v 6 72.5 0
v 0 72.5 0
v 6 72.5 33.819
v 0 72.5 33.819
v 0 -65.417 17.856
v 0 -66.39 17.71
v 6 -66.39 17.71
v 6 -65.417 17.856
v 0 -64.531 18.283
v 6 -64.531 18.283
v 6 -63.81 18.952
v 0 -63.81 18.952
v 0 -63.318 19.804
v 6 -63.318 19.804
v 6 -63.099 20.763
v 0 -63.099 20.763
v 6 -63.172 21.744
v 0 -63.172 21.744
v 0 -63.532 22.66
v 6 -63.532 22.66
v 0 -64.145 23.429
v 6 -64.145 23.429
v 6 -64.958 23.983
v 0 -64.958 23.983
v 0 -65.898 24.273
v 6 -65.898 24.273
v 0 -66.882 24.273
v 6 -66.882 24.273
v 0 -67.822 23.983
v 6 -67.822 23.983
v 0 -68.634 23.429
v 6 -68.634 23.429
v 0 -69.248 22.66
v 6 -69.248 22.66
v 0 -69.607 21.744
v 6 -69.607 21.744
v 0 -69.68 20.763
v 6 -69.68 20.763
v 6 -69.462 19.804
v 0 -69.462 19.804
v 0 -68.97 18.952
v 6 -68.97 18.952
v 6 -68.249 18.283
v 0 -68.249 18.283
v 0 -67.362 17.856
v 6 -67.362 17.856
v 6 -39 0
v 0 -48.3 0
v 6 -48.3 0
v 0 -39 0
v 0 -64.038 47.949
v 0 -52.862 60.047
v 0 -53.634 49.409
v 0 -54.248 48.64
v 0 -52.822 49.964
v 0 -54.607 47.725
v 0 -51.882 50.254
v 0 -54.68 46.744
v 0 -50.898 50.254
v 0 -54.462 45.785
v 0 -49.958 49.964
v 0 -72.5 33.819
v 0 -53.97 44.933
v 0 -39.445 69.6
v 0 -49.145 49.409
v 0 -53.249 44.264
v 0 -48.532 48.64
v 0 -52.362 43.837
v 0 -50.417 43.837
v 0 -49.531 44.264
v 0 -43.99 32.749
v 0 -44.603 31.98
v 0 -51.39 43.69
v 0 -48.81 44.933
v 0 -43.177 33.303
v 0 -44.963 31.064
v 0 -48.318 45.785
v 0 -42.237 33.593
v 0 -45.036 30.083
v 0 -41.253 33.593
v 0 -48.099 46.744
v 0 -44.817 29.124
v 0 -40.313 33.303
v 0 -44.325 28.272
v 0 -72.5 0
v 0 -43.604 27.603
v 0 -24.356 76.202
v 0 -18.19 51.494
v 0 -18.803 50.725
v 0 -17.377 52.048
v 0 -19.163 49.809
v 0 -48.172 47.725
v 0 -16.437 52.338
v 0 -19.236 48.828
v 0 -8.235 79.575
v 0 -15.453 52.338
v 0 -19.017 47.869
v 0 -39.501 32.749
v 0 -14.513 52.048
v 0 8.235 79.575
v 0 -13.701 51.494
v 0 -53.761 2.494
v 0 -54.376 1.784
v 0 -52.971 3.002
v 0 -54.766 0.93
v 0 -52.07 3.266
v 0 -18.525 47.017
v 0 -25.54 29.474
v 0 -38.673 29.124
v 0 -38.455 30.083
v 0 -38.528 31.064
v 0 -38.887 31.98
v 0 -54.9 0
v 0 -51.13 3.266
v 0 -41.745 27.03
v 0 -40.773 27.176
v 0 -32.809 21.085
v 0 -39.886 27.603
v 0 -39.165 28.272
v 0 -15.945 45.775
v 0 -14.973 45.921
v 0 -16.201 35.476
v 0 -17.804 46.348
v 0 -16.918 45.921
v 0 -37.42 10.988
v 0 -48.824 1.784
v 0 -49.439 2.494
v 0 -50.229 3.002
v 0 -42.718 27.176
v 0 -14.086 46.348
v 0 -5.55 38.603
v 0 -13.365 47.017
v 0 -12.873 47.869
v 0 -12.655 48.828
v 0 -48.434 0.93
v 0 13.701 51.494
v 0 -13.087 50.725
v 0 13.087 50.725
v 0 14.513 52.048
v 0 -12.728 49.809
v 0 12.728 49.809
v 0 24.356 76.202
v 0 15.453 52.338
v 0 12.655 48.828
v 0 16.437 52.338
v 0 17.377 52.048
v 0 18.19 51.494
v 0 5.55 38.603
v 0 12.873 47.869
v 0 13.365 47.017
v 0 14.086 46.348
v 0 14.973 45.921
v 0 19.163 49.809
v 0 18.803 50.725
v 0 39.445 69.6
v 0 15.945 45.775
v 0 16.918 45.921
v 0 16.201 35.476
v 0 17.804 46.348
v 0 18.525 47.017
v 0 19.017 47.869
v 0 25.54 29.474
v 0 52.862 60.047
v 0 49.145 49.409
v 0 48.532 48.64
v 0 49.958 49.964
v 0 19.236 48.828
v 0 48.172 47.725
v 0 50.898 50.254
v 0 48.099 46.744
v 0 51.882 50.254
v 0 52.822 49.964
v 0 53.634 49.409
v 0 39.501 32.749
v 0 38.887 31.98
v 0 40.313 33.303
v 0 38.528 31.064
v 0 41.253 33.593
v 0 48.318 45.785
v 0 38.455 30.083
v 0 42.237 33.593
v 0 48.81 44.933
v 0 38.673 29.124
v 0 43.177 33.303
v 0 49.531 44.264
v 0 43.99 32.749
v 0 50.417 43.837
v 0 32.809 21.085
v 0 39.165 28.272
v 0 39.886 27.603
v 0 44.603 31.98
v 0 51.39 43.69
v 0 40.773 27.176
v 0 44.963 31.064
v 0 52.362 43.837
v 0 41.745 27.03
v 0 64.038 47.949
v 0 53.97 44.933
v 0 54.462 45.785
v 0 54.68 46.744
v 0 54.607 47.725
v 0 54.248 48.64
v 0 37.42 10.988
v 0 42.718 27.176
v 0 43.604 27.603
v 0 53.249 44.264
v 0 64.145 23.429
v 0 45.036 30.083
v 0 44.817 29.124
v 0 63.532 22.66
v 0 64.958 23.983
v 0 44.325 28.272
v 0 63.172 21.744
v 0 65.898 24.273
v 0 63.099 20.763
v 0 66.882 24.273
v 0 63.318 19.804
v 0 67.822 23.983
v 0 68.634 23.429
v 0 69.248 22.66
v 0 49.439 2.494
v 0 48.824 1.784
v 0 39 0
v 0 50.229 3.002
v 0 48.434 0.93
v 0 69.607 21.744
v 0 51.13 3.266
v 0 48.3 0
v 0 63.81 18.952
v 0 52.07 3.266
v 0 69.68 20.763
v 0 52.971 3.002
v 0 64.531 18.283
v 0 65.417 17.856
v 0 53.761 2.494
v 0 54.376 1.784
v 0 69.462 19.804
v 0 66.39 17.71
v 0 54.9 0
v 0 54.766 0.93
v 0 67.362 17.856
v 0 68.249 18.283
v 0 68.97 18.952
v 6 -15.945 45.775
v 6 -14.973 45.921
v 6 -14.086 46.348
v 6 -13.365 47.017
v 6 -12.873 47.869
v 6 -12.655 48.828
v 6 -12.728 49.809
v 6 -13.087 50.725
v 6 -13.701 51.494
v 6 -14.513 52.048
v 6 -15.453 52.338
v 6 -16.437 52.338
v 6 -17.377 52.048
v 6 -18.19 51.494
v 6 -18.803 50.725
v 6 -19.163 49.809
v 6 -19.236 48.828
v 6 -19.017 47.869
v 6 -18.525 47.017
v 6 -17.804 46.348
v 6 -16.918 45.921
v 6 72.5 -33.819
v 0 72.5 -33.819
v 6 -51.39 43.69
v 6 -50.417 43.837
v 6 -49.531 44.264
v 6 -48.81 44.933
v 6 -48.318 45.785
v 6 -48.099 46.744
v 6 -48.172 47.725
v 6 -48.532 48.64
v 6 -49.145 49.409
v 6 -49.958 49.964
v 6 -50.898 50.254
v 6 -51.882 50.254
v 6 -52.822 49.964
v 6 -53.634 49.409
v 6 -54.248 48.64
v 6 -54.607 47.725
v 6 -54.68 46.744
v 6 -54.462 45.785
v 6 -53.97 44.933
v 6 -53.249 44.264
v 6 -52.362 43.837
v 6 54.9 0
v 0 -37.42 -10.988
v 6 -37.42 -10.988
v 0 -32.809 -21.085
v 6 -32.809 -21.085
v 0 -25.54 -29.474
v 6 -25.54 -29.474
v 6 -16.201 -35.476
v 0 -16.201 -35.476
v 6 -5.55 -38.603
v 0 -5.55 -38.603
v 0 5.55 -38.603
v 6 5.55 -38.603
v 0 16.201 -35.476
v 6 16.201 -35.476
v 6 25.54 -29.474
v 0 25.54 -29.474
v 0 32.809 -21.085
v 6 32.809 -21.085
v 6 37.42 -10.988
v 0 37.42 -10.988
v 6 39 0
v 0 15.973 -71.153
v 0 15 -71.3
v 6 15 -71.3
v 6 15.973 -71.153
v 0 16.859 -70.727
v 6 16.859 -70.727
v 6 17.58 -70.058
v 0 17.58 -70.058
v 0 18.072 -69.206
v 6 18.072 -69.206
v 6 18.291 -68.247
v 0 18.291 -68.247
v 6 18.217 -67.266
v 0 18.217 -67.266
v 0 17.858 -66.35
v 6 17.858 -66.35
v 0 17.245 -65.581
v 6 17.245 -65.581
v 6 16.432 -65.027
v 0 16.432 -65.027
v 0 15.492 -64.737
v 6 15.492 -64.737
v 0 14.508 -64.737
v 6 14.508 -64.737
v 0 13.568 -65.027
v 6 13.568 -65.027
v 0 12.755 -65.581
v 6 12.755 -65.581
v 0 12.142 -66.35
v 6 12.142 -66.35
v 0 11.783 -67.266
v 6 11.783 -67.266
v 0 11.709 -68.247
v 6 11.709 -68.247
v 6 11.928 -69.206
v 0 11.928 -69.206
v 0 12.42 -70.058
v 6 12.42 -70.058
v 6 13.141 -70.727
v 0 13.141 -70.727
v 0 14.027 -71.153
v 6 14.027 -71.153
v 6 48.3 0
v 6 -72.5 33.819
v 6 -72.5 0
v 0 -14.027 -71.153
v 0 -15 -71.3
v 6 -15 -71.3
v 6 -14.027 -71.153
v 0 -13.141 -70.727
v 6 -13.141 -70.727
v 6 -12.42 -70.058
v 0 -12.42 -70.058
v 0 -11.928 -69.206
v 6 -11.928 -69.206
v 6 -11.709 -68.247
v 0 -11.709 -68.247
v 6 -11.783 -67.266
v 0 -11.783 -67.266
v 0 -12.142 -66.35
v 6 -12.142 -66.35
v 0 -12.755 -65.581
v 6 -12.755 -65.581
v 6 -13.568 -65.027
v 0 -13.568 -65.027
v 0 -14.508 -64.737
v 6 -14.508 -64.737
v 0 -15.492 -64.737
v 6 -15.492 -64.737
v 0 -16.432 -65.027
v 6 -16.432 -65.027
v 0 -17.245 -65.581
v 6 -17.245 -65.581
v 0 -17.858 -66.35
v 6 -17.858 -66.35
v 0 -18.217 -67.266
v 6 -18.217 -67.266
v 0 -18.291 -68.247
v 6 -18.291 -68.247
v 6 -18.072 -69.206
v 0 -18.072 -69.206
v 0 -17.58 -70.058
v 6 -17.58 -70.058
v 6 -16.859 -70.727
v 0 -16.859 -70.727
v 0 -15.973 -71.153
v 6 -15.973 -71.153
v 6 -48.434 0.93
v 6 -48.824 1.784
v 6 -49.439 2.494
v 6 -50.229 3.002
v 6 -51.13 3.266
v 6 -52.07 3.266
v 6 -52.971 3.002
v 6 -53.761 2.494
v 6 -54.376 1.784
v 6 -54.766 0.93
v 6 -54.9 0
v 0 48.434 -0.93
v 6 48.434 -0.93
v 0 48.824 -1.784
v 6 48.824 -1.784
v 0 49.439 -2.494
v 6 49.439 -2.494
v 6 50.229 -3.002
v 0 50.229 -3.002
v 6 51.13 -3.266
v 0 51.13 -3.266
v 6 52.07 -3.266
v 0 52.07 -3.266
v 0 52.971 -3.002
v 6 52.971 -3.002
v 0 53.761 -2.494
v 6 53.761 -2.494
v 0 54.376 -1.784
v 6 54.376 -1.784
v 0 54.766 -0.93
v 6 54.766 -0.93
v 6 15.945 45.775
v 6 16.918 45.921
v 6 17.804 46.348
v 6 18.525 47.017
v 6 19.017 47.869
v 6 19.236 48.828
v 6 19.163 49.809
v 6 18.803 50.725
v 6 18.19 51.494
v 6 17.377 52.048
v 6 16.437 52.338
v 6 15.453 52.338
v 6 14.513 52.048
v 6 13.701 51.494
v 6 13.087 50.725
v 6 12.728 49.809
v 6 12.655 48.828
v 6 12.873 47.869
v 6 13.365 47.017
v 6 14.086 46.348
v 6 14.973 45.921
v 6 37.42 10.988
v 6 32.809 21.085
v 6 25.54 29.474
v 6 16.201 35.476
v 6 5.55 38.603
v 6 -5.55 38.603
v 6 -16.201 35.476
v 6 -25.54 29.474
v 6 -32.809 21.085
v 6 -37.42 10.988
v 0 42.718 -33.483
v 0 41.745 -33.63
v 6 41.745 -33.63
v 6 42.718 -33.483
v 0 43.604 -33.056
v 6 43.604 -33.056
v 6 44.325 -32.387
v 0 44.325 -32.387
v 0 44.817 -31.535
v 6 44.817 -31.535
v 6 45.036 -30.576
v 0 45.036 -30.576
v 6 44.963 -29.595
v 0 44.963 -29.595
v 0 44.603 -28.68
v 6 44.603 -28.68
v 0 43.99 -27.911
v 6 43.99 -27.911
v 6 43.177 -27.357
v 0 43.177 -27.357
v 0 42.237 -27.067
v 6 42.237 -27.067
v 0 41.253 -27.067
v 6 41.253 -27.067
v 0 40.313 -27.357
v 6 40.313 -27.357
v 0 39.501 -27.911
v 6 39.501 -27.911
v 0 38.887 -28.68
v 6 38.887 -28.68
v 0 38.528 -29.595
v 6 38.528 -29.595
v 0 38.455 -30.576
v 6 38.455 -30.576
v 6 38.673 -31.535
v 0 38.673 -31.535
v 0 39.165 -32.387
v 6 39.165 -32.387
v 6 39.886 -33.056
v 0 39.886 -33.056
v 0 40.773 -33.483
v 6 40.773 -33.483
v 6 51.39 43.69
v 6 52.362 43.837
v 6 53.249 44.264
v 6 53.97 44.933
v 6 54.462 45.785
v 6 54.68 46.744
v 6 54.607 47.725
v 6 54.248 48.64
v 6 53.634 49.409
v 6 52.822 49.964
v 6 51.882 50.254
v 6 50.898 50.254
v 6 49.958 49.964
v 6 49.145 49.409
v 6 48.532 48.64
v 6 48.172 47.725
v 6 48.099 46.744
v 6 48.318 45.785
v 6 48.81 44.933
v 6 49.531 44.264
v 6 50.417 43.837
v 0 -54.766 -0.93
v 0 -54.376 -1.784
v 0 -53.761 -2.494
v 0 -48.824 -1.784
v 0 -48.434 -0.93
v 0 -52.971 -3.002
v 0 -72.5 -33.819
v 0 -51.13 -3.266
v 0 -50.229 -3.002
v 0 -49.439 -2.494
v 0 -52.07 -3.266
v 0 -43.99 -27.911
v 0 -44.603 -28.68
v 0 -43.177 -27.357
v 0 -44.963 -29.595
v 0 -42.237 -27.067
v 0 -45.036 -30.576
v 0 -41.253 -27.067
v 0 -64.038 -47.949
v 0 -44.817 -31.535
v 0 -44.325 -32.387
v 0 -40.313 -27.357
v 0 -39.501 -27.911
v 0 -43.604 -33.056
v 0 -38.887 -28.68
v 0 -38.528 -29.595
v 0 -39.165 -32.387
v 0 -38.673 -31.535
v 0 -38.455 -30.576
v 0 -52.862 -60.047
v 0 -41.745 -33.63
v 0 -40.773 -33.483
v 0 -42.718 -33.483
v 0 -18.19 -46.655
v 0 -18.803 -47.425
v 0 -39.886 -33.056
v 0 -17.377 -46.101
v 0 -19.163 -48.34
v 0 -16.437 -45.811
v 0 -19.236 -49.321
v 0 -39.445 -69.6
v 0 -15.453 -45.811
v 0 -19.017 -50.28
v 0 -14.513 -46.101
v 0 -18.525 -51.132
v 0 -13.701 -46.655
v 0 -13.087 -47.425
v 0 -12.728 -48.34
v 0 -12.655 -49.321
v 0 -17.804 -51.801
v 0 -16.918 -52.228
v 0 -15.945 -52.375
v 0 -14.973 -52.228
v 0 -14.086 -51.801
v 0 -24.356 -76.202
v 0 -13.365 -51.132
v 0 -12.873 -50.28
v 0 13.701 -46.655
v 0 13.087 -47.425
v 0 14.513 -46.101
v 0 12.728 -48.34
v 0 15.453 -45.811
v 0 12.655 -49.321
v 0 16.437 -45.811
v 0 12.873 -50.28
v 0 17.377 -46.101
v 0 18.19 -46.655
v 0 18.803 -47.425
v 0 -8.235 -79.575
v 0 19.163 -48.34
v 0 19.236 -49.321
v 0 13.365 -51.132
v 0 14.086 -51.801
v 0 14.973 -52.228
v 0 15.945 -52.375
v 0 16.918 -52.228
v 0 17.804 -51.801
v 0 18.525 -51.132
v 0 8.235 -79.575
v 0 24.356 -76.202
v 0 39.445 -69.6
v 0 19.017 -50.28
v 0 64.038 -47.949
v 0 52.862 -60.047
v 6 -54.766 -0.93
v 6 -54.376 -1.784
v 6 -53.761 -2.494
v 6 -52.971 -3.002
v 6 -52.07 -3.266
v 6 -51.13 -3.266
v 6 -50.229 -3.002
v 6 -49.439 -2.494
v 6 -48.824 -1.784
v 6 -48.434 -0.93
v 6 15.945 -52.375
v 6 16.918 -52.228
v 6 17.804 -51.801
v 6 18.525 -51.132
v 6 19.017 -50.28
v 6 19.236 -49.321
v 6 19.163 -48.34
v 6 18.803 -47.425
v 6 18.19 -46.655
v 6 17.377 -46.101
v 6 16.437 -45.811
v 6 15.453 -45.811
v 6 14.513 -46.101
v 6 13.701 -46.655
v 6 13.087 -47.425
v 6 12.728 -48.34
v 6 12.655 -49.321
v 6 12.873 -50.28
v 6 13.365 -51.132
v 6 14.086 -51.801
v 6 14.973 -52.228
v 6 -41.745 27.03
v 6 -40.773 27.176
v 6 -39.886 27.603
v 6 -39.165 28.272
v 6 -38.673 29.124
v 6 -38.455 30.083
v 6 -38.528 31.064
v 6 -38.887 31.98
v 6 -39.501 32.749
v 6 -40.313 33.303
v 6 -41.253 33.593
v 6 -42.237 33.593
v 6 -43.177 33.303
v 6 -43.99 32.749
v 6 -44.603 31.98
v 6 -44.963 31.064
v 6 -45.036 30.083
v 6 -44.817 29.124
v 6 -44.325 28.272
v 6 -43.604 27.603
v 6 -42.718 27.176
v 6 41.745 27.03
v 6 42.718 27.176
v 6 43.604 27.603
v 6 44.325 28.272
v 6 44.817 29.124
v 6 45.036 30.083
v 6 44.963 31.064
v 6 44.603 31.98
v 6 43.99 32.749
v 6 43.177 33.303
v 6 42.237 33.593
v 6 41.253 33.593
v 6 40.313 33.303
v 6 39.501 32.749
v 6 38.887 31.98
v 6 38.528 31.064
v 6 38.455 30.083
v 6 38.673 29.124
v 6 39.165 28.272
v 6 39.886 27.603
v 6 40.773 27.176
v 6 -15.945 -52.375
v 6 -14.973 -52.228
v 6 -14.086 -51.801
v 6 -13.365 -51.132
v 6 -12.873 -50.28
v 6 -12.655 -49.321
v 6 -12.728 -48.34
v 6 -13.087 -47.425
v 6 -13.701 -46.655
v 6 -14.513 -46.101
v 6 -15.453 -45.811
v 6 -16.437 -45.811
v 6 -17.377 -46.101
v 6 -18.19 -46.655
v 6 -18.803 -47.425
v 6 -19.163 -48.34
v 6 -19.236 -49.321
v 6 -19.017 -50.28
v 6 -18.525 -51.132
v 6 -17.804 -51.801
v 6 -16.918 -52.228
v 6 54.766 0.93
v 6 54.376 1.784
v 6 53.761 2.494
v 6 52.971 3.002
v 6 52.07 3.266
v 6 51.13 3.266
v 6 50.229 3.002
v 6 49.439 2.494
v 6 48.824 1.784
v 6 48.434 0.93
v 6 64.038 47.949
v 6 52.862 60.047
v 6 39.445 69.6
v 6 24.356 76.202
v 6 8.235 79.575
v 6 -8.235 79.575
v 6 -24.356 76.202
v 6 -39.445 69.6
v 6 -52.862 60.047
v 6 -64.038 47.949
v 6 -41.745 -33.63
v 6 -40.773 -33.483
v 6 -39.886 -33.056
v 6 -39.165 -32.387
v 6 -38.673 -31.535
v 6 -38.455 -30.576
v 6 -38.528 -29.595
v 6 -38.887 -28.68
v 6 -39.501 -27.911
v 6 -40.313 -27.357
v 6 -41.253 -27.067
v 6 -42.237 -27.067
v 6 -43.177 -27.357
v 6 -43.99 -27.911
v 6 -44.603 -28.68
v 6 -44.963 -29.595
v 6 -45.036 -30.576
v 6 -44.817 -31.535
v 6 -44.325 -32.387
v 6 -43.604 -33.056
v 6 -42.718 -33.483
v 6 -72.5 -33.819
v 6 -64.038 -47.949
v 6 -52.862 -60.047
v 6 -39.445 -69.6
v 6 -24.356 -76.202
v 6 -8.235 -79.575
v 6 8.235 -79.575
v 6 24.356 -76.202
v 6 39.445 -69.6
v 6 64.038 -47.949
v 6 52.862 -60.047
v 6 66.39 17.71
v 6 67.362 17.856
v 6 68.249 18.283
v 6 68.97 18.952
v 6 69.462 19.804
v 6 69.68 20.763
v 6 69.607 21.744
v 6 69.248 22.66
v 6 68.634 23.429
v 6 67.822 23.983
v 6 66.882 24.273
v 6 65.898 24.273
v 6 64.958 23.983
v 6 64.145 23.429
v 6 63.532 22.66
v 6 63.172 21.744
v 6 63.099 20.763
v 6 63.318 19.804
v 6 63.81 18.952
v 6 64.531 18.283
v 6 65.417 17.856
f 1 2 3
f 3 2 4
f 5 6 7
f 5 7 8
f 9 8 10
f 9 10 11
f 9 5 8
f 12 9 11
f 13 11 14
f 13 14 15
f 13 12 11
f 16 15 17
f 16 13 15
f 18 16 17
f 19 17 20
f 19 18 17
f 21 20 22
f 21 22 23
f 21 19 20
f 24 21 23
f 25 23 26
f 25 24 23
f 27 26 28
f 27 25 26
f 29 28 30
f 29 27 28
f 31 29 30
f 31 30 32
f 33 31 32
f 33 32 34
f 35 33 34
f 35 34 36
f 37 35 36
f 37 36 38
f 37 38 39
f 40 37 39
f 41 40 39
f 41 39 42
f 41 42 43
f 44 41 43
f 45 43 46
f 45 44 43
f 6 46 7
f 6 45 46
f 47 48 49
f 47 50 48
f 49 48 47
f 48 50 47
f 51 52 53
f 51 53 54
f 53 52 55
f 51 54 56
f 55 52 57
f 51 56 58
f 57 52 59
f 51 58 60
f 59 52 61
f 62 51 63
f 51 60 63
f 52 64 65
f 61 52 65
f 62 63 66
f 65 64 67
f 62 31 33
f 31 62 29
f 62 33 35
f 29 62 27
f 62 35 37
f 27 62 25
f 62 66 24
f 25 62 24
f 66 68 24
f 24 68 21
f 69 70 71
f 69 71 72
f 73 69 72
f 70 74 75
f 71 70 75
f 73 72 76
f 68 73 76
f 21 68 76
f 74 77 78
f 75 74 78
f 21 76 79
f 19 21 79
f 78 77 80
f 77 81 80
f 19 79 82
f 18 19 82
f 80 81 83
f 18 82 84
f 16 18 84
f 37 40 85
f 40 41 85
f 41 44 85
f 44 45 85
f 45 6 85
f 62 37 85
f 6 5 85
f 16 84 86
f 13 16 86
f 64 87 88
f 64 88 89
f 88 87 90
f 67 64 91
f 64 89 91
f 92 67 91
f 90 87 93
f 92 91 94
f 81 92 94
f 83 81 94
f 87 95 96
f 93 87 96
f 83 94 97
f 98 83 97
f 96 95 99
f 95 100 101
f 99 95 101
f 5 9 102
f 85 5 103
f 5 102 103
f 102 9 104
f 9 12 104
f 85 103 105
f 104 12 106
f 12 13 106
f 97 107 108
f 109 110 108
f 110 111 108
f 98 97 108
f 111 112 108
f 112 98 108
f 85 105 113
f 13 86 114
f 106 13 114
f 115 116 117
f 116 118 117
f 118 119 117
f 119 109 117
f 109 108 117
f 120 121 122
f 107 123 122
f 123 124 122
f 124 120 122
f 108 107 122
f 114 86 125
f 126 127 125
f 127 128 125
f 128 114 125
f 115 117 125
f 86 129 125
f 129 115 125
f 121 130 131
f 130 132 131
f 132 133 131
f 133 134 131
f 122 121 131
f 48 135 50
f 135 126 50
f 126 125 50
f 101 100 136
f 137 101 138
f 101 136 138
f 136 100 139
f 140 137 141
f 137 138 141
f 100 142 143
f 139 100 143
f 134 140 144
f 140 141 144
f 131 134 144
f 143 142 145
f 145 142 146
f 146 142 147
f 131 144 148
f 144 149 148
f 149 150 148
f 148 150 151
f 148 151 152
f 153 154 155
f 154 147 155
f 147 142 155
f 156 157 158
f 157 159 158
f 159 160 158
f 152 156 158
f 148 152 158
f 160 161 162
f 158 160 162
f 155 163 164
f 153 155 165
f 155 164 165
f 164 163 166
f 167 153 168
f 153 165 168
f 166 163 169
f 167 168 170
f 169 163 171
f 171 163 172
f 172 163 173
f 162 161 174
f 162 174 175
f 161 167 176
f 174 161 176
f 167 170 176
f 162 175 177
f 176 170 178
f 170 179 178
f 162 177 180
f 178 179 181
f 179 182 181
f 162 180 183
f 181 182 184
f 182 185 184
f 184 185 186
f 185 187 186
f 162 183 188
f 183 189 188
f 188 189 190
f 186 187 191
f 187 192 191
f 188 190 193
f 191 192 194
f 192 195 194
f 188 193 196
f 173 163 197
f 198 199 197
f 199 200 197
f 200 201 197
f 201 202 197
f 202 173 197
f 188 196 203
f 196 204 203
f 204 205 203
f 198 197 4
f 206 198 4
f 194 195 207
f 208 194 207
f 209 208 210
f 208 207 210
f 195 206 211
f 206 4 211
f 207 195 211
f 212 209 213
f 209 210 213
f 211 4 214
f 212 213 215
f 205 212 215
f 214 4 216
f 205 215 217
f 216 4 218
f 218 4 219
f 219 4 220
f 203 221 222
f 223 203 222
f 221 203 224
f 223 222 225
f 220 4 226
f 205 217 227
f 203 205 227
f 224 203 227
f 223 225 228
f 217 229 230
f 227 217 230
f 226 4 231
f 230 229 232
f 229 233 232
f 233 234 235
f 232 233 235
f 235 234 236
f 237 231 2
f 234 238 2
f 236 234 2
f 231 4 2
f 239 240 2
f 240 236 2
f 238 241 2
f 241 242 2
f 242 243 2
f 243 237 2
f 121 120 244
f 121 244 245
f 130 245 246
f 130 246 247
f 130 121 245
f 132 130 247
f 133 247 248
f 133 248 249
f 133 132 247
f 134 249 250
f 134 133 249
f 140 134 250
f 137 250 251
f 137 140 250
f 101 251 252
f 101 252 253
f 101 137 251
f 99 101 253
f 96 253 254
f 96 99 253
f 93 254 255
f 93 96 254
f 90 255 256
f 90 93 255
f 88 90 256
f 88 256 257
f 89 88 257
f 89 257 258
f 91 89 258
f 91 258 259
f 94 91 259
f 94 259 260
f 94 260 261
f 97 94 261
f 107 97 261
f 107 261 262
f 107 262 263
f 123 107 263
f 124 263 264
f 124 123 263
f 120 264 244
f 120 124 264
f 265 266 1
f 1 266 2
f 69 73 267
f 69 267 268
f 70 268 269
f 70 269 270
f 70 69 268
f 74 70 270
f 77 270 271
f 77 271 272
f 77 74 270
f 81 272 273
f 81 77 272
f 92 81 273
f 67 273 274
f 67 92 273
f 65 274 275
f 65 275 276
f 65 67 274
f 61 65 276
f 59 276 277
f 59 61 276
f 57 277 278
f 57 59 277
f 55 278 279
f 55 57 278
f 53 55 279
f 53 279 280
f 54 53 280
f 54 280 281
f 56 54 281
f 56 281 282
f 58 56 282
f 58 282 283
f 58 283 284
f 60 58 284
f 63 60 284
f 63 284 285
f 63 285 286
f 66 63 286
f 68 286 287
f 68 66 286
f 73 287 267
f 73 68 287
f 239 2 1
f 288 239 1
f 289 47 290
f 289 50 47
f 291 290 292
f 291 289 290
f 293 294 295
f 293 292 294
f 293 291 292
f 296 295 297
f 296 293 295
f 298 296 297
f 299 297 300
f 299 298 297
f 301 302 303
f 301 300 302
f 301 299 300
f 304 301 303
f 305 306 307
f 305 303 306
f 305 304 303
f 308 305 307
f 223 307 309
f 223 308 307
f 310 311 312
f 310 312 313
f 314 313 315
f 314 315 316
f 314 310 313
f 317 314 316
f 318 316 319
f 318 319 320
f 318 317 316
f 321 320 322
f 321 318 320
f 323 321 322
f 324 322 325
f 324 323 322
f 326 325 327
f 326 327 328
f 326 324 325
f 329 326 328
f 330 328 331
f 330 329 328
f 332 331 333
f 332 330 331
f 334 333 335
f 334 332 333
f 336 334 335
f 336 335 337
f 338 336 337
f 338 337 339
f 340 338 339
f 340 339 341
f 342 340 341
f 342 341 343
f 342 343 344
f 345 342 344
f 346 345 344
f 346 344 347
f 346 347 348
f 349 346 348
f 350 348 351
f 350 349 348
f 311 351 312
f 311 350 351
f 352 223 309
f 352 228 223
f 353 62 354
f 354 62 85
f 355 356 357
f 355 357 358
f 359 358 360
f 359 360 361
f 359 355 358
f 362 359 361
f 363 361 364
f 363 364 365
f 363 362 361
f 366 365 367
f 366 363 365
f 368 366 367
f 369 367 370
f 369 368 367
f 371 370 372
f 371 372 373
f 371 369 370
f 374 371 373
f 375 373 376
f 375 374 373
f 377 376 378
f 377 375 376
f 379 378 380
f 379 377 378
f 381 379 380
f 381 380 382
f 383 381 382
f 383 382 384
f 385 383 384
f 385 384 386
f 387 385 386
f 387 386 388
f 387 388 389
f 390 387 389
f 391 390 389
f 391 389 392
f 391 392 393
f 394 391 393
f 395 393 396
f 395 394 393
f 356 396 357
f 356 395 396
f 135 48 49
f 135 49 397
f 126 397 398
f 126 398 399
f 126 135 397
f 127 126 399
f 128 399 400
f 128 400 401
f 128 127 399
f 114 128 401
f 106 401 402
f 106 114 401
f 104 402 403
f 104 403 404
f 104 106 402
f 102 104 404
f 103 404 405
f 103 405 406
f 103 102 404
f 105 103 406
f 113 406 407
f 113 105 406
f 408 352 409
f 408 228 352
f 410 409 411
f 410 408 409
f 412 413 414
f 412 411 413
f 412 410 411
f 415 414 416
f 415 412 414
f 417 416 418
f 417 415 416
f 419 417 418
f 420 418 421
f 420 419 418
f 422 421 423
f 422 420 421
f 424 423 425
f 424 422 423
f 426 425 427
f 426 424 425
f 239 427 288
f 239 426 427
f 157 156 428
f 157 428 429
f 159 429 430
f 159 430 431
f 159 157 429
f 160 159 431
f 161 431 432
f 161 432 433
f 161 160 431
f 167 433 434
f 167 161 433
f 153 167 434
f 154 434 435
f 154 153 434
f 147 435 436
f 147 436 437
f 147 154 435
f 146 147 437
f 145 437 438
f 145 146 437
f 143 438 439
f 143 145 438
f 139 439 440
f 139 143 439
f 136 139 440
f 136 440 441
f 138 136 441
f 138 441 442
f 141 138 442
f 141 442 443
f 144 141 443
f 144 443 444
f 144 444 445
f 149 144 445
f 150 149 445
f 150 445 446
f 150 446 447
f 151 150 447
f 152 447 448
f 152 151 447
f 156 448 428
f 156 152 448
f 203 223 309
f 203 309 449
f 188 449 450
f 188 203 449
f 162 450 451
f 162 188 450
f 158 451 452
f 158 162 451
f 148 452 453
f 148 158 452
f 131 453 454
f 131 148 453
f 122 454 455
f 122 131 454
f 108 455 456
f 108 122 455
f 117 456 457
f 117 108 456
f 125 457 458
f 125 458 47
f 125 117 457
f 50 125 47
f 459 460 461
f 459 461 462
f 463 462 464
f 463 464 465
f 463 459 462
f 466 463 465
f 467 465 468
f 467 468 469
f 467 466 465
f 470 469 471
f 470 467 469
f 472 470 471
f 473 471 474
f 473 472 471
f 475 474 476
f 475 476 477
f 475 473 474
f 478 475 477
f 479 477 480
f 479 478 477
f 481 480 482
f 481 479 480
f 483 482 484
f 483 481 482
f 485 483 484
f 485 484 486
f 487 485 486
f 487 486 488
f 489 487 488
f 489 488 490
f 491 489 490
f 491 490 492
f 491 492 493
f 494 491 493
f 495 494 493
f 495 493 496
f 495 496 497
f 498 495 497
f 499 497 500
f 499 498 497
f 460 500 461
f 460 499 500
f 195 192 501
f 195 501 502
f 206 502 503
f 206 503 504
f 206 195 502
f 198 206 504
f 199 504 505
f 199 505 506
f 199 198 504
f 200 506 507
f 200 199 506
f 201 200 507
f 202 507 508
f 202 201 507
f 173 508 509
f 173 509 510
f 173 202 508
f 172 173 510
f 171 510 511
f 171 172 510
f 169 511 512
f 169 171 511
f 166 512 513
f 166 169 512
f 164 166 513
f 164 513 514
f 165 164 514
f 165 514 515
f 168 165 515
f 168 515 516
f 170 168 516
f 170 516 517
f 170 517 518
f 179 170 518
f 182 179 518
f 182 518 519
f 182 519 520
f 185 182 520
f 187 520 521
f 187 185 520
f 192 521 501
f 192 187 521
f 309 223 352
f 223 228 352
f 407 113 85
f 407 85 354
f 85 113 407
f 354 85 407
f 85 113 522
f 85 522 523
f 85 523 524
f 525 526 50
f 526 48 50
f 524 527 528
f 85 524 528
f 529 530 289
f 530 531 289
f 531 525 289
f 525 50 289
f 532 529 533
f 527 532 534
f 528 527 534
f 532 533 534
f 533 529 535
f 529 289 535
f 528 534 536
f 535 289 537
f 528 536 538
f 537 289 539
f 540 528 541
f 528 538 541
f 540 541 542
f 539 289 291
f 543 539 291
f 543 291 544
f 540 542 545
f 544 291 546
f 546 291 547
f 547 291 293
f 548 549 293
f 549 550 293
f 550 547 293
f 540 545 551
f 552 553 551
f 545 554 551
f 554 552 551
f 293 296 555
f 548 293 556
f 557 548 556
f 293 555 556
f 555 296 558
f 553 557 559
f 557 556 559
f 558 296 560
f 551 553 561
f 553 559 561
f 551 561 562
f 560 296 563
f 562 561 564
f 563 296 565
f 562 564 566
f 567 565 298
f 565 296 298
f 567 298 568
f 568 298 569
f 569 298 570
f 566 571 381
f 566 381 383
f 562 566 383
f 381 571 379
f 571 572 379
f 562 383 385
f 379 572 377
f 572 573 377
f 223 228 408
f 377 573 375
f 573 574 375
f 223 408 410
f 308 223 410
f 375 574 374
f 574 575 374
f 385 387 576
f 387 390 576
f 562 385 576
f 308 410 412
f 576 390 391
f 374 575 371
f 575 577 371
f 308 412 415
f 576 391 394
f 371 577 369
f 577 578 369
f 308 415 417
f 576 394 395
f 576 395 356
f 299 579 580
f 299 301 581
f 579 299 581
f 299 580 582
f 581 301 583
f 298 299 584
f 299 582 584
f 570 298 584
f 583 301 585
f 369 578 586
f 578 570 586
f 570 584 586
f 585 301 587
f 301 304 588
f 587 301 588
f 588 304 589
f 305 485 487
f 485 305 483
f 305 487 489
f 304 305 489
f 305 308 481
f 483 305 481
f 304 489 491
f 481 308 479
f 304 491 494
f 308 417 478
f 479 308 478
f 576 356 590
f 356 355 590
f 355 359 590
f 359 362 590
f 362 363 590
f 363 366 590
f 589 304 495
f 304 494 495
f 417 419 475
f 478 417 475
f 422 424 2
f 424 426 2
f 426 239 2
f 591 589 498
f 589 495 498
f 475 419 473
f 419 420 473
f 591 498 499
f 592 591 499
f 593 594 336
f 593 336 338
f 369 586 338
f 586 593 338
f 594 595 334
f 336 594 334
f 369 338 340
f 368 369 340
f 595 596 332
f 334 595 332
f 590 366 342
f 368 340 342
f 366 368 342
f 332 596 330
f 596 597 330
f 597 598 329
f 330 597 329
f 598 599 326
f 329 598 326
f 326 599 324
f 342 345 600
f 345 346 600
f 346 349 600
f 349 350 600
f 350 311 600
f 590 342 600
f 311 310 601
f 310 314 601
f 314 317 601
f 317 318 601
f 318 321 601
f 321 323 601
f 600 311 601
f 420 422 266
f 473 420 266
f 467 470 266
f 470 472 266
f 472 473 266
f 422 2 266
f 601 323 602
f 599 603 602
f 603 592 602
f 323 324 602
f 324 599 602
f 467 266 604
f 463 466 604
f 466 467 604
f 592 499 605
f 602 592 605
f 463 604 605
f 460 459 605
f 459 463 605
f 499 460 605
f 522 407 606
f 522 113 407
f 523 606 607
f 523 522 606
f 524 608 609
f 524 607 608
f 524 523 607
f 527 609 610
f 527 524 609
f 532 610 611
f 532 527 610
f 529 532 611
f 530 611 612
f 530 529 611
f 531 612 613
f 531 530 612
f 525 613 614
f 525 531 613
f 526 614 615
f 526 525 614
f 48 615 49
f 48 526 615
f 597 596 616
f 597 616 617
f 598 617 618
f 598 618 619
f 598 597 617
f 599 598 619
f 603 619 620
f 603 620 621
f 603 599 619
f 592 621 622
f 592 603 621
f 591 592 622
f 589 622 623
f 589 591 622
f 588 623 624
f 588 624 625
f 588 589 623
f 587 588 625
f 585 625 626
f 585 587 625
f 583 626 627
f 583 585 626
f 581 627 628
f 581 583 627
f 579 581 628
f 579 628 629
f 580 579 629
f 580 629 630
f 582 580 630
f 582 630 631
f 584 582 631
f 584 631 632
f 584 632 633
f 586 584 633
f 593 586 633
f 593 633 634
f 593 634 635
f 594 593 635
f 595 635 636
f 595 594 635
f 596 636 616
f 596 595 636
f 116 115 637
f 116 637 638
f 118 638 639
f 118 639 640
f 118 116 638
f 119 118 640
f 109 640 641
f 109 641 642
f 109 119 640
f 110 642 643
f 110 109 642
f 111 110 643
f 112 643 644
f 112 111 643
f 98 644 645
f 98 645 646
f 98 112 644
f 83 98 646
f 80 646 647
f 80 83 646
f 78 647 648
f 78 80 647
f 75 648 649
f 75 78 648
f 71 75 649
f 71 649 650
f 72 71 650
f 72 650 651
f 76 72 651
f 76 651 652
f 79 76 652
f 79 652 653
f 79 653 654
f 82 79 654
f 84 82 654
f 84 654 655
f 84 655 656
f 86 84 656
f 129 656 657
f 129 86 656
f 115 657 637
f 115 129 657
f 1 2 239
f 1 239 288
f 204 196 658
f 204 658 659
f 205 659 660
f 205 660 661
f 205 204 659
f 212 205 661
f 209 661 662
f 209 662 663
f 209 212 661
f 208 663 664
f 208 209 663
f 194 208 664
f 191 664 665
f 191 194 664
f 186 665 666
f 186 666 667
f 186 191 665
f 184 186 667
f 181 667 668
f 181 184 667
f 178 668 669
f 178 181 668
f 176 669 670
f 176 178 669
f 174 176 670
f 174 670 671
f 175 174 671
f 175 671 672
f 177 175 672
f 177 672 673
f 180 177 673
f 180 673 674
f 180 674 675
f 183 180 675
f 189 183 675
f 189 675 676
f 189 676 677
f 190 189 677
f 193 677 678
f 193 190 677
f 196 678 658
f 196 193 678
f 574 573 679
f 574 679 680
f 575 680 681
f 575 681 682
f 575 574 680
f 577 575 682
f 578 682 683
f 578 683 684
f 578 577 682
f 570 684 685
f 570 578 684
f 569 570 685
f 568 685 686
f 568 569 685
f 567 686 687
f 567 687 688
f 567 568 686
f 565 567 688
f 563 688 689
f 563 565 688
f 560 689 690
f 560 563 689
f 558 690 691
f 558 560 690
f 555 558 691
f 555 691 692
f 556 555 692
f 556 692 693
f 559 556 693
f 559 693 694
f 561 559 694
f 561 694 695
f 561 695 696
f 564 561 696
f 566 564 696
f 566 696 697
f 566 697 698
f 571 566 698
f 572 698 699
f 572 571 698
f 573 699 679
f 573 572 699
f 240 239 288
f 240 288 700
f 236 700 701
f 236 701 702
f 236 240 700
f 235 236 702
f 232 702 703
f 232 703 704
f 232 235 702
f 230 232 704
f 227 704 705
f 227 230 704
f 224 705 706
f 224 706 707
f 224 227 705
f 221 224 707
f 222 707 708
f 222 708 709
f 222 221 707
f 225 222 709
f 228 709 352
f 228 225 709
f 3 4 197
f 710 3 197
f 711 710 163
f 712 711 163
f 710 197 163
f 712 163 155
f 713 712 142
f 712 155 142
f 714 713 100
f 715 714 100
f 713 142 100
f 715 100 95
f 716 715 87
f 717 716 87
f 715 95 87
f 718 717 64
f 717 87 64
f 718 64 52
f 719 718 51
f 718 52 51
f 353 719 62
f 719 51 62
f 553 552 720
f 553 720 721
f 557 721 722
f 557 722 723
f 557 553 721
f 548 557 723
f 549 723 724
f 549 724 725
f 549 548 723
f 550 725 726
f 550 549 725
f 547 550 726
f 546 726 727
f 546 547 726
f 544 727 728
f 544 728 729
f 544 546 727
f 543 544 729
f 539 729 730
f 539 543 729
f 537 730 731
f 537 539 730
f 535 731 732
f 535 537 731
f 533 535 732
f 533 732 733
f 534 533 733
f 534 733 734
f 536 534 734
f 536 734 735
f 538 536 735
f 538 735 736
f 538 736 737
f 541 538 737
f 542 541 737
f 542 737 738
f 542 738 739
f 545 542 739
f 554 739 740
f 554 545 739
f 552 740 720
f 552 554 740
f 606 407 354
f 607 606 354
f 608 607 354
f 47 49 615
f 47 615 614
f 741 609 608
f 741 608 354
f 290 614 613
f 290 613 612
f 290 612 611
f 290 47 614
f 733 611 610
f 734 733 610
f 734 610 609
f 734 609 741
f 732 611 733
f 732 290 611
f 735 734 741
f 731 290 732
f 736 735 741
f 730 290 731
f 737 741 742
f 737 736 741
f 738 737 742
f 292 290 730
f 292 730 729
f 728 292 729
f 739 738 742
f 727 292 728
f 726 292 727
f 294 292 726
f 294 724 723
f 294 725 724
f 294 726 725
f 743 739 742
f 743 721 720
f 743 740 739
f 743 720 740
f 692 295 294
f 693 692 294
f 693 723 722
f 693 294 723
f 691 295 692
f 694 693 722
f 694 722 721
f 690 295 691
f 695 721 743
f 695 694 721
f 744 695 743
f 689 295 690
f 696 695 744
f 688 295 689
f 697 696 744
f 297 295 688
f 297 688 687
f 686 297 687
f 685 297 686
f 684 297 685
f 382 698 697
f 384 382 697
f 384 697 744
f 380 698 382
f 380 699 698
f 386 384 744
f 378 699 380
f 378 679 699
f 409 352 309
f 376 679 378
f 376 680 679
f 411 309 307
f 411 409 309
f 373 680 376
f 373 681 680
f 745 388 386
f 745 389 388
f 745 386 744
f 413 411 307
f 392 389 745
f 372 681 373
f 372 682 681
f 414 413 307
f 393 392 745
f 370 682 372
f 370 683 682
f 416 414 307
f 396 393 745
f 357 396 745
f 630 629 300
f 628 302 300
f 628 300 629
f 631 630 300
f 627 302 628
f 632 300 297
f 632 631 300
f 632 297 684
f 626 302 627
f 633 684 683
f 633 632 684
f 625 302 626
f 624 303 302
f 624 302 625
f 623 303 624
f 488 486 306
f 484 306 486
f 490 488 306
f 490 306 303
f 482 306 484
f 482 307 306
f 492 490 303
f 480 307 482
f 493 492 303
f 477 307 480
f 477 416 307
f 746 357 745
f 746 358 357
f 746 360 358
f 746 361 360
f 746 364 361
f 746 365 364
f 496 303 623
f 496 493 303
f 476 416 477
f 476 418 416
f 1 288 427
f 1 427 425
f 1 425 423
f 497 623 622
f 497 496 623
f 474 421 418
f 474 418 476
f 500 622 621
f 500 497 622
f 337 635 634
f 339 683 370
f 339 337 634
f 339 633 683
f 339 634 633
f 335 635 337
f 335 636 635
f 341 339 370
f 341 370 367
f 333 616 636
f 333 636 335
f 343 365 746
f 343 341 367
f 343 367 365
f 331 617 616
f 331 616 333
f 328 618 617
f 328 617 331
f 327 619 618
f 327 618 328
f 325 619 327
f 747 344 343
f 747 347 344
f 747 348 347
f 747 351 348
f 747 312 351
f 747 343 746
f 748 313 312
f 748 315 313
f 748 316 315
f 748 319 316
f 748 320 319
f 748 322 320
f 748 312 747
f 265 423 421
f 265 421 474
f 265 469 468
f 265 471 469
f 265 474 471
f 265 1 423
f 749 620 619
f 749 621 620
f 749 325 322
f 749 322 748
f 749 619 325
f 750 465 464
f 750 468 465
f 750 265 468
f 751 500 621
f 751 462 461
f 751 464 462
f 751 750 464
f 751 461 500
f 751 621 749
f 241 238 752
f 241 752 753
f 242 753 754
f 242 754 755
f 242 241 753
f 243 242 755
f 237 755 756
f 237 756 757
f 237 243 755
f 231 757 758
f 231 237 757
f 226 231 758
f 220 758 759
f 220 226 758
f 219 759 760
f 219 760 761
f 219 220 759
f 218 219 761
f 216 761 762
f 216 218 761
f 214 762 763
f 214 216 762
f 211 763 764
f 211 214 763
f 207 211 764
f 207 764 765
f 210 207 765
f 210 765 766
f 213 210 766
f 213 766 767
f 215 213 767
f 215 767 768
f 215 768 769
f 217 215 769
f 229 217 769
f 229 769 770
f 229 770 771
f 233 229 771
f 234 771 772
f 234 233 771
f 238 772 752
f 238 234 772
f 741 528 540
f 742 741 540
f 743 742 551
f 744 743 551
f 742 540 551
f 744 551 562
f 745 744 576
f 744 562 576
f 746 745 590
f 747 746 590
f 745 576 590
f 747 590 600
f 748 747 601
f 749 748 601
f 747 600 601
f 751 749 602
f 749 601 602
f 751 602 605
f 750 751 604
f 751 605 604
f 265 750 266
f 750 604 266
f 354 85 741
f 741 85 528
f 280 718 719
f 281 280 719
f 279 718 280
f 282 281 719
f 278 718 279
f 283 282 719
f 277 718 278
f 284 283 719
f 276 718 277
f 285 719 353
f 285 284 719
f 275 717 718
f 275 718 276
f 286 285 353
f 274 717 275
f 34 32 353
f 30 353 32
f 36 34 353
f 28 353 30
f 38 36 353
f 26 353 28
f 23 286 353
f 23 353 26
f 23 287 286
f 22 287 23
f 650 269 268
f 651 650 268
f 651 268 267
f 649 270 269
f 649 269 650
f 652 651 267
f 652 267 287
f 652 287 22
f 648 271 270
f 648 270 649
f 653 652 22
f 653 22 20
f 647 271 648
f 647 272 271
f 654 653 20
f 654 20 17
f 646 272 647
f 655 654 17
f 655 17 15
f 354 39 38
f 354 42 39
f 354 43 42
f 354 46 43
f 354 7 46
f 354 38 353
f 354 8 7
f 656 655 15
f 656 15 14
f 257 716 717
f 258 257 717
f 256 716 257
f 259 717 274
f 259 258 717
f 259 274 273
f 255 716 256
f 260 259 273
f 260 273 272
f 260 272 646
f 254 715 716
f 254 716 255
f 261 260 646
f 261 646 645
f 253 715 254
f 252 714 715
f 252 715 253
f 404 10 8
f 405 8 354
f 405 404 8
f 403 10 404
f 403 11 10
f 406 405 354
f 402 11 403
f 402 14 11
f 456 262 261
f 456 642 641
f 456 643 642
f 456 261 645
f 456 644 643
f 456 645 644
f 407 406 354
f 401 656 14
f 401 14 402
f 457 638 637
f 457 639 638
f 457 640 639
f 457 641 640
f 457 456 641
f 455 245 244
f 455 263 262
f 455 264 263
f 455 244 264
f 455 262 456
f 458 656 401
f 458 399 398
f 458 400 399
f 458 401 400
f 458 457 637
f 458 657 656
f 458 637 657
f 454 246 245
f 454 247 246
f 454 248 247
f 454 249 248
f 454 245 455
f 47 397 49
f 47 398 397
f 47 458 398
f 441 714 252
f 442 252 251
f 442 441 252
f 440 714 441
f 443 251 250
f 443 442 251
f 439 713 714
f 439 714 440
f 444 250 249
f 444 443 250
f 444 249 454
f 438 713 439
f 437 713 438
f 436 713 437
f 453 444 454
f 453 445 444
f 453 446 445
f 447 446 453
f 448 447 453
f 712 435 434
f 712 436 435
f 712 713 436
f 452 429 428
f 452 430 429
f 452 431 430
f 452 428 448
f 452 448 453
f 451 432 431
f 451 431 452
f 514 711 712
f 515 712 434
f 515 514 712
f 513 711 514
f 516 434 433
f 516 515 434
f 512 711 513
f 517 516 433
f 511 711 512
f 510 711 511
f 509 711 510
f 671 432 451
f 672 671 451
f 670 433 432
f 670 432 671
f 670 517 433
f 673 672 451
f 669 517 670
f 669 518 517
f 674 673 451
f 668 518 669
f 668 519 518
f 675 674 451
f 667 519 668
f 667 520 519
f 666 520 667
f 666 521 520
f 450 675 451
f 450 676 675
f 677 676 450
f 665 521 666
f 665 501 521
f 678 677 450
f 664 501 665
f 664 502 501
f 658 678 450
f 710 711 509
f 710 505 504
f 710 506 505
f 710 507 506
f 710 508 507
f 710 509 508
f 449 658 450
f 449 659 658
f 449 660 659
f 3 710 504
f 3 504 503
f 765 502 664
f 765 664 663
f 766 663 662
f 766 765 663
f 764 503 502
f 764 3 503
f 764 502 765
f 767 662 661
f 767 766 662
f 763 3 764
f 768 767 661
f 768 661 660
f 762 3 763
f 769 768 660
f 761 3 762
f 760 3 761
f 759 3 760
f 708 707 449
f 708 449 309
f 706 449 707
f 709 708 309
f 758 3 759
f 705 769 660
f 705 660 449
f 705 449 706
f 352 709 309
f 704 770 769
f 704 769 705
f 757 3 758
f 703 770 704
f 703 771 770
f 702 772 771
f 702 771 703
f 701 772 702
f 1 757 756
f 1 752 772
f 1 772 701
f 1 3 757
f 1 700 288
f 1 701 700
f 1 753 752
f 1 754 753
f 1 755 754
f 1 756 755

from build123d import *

# Parameters (mm, degrees)
SKETCH1_R           = 3.3
SKETCH1_R_2         = 39
BOSS_EXTRUDE1_DEPTH = 6


with BuildPart() as part:
    # Sketch1 → Boss-Extrude1 (new body)
    with BuildSketch(Plane(origin=(0, 0, 0), x_dir=(0, 0, -1), z_dir=(1, 0, 0))):
        with BuildLine():
            Line((-33.819373146, -72.5), (33.819373146, -72.5))
            ThreePointArc((33.819373146, -72.5), (80, 0), (33.819373146, 72.5))
            Line((33.819373146, 72.5), (-33.819373146, 72.5))
            ThreePointArc((-33.819373146, 72.5), (-80, 0), (-33.819373146, -72.5))
        make_face()
        with Locations((-46.990381057, 51.389727457)):
            Circle(SKETCH1_R, mode=Mode.SUBTRACT)
        with Locations((-21.009618943, 66.389727457)):
            Circle(SKETCH1_R, mode=Mode.SUBTRACT)
        with Locations((-21.009618943, -66.389727457)):
            Circle(SKETCH1_R, mode=Mode.SUBTRACT)
        with Locations((-46.990381057, -51.389727457)):
            Circle(SKETCH1_R, mode=Mode.SUBTRACT)
        with Locations((68, -15)):
            Circle(SKETCH1_R, mode=Mode.SUBTRACT)
        with Locations((68, 15)):
            Circle(SKETCH1_R, mode=Mode.SUBTRACT)
        with Locations((0, 51.6)):
            Circle(SKETCH1_R, mode=Mode.SUBTRACT)
        with Locations((30.329719018, 41.74527691)):
            Circle(SKETCH1_R, mode=Mode.SUBTRACT)
        with Locations((49.074516241, 15.94527691)):
            Circle(SKETCH1_R, mode=Mode.SUBTRACT)
        with Locations((49.074516241, -15.94527691)):
            Circle(SKETCH1_R, mode=Mode.SUBTRACT)
        with Locations((30.329719018, -41.74527691)):
            Circle(SKETCH1_R, mode=Mode.SUBTRACT)
        with Locations((0, -51.6)):
            Circle(SKETCH1_R, mode=Mode.SUBTRACT)
        with Locations((-30.329719018, -41.74527691)):
            Circle(SKETCH1_R, mode=Mode.SUBTRACT)
        with Locations((-49.074516241, -15.94527691)):
            Circle(SKETCH1_R, mode=Mode.SUBTRACT)
        with Locations((-49.074516241, 15.94527691)):
            Circle(SKETCH1_R, mode=Mode.SUBTRACT)
        with Locations((-30.329719018, 41.74527691)):
            Circle(SKETCH1_R, mode=Mode.SUBTRACT)
        Circle(SKETCH1_R_2, mode=Mode.SUBTRACT)
    extrude(amount=BOSS_EXTRUDE1_DEPTH)


with BuildPart() as body_2:
    # Split1: the piece on the far side of the plane
    add(part.part)
    split(bisect_by=Plane.XY, keep=Keep.BOTTOM)


with BuildPart() as part_1:
    add(part.part)

    # Split1
    split(bisect_by=Plane.XY, keep=Keep.TOP)


solid = Compound([body_2.part, part_1.part])
